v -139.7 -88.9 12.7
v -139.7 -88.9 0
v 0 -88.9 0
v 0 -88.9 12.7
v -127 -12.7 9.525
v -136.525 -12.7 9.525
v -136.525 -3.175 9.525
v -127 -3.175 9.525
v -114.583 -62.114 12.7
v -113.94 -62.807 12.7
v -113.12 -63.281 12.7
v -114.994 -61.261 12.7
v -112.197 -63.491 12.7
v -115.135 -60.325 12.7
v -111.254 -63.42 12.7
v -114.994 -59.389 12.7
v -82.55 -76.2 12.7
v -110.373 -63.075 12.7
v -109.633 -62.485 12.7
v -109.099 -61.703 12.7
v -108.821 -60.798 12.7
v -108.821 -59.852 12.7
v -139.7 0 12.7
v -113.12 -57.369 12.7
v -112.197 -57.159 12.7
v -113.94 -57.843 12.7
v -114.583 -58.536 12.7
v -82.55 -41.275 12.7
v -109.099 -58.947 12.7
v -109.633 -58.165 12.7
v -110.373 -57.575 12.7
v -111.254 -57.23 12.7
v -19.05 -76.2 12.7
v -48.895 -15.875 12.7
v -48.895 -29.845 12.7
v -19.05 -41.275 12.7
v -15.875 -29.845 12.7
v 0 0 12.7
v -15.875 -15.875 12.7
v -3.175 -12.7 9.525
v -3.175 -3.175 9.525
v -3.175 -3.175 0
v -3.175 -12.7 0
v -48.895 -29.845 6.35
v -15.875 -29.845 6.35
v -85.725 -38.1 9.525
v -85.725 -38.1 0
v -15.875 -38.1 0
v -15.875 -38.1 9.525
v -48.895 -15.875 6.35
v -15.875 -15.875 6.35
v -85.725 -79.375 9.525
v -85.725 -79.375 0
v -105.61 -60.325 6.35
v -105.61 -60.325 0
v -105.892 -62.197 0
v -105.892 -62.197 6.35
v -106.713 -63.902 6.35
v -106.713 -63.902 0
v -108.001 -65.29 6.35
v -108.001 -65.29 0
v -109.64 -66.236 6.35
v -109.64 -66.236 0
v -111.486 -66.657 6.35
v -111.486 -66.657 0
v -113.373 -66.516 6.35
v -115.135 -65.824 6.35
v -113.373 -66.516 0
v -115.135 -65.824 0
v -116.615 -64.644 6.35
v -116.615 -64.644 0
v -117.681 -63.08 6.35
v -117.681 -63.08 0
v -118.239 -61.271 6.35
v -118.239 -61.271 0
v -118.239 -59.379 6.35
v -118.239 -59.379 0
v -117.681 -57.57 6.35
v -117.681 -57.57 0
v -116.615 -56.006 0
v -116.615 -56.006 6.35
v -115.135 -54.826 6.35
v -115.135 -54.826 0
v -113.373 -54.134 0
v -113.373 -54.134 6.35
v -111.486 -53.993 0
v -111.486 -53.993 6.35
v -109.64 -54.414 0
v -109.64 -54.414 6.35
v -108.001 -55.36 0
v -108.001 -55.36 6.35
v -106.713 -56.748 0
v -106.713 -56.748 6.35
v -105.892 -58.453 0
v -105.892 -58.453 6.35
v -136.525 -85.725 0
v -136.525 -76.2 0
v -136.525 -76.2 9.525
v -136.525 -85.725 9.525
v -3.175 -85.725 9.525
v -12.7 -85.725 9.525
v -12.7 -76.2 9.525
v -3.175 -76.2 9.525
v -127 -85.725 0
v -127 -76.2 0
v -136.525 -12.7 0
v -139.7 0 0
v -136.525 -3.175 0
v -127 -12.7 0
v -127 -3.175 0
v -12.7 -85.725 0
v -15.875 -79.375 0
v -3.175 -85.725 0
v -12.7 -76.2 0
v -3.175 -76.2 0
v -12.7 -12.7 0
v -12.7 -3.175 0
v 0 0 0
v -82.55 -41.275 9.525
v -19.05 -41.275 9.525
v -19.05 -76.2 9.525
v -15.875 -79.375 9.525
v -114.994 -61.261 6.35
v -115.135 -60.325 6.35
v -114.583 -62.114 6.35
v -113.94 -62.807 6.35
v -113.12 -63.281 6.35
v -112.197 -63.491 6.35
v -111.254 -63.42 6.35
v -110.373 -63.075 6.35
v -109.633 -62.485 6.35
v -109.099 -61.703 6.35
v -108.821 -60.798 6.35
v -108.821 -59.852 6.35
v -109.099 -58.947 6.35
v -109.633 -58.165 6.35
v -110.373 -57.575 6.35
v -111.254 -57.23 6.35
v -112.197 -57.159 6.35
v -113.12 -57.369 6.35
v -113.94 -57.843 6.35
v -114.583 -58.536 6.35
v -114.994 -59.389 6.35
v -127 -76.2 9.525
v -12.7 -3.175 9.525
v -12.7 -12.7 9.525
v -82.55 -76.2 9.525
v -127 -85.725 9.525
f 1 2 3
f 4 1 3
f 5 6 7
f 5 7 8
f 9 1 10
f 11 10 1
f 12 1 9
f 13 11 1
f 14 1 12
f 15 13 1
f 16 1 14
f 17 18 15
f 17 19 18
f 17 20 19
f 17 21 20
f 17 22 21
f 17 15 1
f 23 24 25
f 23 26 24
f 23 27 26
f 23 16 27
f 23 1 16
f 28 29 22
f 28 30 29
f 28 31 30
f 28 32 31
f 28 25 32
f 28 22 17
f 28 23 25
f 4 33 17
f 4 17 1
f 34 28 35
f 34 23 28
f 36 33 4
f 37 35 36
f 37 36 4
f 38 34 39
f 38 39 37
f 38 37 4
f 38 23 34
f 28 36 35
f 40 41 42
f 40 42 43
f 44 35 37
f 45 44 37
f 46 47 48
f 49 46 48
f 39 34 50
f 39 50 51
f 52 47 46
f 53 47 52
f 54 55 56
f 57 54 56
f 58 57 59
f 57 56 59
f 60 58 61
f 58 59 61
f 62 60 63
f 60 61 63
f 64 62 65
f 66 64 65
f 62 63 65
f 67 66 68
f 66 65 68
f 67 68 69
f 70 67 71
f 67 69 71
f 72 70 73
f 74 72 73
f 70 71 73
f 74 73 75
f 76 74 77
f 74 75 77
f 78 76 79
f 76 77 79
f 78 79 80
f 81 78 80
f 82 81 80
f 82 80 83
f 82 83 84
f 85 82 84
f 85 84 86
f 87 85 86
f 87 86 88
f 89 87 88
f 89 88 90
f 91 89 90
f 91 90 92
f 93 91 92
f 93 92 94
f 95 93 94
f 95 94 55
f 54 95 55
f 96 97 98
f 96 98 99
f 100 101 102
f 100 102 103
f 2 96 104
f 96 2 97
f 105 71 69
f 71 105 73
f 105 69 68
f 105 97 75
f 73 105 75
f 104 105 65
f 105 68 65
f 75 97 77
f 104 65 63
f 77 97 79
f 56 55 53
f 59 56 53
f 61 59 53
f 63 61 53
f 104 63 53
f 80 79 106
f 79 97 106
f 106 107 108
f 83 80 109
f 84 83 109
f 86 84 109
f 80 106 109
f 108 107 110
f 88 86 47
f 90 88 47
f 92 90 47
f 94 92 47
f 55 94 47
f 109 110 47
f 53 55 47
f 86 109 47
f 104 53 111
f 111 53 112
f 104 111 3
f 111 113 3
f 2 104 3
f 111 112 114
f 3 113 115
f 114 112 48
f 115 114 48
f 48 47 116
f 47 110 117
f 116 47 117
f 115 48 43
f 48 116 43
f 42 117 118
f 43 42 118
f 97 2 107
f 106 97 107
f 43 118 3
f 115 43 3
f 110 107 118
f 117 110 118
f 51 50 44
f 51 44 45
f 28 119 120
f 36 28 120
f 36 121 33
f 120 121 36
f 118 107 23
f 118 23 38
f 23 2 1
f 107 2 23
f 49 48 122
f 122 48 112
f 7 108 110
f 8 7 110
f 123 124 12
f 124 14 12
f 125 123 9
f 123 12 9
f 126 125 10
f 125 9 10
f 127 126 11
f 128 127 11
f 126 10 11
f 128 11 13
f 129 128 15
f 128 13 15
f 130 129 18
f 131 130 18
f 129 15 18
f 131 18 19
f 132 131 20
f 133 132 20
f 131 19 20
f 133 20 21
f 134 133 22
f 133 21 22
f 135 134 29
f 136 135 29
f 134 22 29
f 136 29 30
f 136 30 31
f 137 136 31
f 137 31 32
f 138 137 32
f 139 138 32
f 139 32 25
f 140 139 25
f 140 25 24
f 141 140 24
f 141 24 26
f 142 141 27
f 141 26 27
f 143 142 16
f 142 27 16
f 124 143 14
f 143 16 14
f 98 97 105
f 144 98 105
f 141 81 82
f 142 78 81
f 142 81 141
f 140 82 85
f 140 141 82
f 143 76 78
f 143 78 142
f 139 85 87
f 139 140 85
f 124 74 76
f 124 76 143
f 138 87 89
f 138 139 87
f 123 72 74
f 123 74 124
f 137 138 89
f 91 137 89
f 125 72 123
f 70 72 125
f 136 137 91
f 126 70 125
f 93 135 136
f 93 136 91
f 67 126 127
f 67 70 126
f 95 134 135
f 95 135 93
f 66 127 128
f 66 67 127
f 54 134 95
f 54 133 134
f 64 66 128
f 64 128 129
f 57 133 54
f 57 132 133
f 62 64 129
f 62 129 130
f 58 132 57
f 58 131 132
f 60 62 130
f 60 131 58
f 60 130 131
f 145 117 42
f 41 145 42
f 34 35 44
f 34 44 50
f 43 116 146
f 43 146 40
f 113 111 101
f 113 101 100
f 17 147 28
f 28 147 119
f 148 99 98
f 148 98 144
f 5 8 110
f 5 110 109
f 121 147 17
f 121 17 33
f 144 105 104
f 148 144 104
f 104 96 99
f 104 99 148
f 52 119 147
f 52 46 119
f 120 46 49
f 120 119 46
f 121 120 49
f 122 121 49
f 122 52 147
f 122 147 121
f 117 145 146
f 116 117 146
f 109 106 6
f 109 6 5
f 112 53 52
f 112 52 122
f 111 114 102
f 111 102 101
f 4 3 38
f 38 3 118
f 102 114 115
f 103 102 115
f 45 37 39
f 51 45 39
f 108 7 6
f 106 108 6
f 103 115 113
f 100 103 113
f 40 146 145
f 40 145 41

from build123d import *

# Parameters (mm, degrees)
F0_W           = 139.7
F0_H           = 88.9
F0_W_2         = 63.5
F0_H_2         = 34.925
F1_DEPTH       = 12.7
F2_W           = 9.525
F2_H           = 9.525
F2_W_2         = 69.85
F2_H_2         = 41.275
F3_DEPTH       = 9.525
F4_W           = 33.02
F4_H           = 13.97
F5_DEPTH       = 6.35
F7_D           = 6.35
F7_CBORE_D     = 12.7
F7_CBORE_DEPTH = 6.35


with BuildPart() as f1:
    # F0 (on Top) → F1 (new body)
    with BuildSketch(Plane.XY):
        with Locations((-69.85, -44.45)):
            Rectangle(F0_W, F0_H)
        with Locations((-50.8, -58.7375)):
            Rectangle(F0_W_2, F0_H_2, mode=Mode.SUBTRACT)
    extrude(amount=F1_DEPTH)

    # F2 (on face) → F3 (cut)
    with BuildSketch(Plane(origin=(0, 0, 0), x_dir=(1, 0, 0), z_dir=(0, 0, -1))):
        with Locations((-131.7625, 7.9375)):
            Rectangle(F2_W, F2_H)
        with Locations((-131.7625, 80.9625)):
            Rectangle(F2_W, F2_H)
        with Locations((-7.9375, 7.9375)):
            Rectangle(F2_W, F2_H)
        with Locations((-7.9375, 80.9625)):
            Rectangle(F2_W, F2_H)
        with Locations((-50.8, 58.7375)):
            Rectangle(F2_W_2, F2_H_2)
    extrude(amount=-F3_DEPTH, mode=Mode.SUBTRACT)

    # F4 (on face) → F5 (cut)
    with BuildSketch(Plane.XY.offset(12.7)):
        with Locations((-32.385, -22.86)):
            Rectangle(F4_W, F4_H)
    extrude(amount=-F5_DEPTH, mode=Mode.SUBTRACT)

    # F7 (through all)
    with Locations(Plane(origin=(0, 0, 0), x_dir=(1, 0, 0), z_dir=(0, 0, -1))):
        with Locations((-111.960039, 60.325)):
            CounterBoreHole(F7_D / 2, F7_CBORE_D / 2, F7_CBORE_DEPTH)


solid = f1.part
